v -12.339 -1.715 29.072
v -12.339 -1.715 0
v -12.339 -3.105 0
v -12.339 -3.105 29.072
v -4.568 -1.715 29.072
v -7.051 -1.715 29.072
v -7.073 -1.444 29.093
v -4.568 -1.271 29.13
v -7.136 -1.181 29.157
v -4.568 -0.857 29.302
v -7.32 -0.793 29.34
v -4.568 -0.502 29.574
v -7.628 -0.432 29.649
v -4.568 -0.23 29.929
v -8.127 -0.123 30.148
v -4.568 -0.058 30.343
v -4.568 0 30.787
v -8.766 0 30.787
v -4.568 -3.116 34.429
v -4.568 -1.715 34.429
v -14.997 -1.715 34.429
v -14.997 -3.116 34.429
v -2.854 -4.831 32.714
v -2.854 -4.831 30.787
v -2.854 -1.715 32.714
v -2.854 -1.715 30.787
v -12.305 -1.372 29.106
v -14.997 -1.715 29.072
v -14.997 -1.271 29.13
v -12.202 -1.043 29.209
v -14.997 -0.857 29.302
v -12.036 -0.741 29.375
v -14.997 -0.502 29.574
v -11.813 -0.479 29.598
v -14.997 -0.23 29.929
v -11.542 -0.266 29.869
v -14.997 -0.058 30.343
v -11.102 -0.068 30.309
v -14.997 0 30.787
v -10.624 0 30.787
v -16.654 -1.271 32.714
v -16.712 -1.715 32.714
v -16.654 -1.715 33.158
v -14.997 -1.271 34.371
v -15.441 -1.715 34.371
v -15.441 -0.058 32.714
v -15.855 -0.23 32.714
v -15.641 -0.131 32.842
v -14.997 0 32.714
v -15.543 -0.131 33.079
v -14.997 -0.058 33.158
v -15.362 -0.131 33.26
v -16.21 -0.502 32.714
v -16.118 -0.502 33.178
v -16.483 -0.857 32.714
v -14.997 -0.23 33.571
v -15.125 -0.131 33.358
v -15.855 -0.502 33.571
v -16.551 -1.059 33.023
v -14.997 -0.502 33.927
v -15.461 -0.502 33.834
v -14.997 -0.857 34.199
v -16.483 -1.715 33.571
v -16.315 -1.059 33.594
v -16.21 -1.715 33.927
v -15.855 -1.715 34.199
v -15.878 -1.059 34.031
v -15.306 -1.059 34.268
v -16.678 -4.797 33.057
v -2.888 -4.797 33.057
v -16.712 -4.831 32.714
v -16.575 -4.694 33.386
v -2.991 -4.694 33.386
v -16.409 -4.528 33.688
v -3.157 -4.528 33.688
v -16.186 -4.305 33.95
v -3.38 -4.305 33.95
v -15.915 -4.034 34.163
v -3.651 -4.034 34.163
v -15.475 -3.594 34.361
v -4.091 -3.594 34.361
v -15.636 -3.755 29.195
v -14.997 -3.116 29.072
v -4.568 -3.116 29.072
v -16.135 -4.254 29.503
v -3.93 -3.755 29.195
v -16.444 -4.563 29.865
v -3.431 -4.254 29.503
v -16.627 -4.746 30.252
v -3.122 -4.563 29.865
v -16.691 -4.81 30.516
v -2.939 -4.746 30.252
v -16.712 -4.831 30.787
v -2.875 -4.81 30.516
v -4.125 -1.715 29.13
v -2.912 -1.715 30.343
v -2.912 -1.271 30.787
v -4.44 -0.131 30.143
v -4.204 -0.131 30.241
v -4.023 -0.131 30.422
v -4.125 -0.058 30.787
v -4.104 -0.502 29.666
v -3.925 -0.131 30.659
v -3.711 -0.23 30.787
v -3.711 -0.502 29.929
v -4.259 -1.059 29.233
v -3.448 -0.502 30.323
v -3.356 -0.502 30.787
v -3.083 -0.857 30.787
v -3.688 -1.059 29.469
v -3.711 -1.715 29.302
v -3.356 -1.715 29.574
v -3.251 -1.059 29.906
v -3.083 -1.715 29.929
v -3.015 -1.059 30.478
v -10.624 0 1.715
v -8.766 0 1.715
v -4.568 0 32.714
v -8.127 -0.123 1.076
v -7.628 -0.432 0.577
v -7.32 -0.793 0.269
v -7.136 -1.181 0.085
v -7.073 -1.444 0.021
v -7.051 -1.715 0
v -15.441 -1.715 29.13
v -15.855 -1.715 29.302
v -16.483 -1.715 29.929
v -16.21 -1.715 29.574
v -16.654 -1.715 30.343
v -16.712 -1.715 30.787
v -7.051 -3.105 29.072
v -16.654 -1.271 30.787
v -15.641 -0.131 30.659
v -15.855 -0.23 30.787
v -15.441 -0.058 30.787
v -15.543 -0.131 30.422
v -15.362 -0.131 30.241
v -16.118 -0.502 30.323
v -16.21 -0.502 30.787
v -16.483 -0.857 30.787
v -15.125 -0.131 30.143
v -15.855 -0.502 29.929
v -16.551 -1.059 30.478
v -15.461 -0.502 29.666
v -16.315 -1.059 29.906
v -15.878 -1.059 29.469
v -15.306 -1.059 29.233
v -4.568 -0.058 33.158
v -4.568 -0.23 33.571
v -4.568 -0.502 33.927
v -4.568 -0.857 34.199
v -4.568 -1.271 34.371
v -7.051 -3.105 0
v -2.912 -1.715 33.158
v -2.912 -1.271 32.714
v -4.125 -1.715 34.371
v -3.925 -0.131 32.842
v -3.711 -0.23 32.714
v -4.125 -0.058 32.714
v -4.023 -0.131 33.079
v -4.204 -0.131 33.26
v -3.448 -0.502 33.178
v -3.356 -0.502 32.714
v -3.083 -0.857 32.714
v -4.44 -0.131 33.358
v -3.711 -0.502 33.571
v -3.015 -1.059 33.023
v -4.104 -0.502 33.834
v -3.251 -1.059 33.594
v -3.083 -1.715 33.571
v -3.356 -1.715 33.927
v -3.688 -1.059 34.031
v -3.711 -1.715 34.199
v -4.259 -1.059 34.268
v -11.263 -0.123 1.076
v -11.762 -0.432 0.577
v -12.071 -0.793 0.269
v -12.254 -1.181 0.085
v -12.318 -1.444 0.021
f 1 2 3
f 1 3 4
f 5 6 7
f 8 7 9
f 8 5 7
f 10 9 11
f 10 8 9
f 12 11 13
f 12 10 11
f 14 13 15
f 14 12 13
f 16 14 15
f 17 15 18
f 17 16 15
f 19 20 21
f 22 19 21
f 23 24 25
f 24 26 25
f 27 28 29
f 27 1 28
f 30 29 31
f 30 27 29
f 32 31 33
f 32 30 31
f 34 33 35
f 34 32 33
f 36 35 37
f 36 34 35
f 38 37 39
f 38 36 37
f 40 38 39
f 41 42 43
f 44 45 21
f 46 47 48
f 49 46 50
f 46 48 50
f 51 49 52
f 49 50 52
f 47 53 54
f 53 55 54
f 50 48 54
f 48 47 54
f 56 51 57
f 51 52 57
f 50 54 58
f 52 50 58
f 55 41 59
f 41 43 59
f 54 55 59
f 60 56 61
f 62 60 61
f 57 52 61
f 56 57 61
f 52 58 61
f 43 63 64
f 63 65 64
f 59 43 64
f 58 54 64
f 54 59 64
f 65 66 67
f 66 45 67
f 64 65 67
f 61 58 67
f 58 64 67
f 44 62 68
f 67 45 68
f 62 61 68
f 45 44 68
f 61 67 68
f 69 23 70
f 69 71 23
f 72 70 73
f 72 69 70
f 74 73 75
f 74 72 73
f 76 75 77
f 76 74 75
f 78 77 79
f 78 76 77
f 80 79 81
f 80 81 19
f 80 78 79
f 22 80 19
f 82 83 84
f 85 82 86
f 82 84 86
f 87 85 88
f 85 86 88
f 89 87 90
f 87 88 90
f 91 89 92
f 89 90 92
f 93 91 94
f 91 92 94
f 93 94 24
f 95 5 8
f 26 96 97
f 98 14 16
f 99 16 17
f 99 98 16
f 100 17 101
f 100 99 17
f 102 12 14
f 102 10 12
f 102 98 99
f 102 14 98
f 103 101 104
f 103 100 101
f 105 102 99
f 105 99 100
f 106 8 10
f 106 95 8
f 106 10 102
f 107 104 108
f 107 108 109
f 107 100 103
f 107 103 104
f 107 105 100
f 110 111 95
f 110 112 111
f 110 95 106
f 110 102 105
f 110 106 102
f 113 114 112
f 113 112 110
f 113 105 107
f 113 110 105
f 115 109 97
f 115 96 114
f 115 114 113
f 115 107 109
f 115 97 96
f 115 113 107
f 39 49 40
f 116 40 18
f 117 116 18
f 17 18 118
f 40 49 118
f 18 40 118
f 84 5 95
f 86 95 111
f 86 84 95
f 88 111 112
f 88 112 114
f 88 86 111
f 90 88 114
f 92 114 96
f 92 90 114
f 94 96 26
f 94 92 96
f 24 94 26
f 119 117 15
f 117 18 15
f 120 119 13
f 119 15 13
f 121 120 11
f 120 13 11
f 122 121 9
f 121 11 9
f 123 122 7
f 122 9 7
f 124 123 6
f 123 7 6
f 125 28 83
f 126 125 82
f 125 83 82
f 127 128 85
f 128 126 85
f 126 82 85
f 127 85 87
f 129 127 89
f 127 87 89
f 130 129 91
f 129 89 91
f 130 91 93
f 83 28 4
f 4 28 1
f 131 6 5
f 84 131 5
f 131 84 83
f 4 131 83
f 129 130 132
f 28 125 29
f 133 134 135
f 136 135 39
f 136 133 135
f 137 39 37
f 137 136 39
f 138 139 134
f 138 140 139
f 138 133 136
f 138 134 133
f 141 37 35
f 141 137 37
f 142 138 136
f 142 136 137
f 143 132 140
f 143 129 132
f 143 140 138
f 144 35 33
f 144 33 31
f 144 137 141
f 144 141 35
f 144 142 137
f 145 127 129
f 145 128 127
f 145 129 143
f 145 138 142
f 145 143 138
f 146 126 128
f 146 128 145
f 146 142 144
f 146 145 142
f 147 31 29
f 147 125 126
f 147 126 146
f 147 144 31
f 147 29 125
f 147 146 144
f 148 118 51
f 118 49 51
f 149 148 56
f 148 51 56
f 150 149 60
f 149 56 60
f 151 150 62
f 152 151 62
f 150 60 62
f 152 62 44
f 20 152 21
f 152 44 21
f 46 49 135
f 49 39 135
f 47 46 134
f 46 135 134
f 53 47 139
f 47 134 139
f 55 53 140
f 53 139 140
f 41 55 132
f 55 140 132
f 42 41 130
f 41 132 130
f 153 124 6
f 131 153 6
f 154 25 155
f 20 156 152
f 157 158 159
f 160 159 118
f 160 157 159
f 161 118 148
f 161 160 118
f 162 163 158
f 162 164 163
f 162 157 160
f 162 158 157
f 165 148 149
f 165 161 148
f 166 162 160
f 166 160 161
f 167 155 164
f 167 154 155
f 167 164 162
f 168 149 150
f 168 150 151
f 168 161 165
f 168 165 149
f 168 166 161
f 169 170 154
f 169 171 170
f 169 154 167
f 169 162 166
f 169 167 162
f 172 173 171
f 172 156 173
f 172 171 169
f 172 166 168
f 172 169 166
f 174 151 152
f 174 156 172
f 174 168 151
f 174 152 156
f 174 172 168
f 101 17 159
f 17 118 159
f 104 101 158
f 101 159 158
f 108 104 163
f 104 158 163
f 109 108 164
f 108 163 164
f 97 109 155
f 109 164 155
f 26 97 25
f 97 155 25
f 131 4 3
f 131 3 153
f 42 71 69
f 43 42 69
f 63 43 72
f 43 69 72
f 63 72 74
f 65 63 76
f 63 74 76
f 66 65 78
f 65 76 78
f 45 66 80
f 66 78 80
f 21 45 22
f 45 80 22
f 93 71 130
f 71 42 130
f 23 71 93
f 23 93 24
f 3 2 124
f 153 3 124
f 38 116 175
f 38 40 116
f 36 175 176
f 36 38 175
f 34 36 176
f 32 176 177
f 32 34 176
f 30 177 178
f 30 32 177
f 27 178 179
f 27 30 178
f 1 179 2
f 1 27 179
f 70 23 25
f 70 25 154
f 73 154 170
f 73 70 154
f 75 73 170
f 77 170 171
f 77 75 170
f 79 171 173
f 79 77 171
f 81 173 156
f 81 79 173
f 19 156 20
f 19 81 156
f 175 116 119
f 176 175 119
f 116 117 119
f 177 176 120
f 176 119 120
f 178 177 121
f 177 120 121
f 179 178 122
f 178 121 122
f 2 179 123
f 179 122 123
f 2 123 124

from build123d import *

# Parameters (mm, degrees)
F0_W     = 5.288299
F0_H     = 29.085644
F1_DEPTH = 3.10534
F3_DEPTH = 4.83128
F4_R     = 1.714961


with BuildPart() as f1:
    # F0 (on Front) → F1 (new body)
    with BuildSketch(Plane.XZ):
        with Locations((-9.695214, 14.542822)):
            Rectangle(F0_W, F0_H)
    extrude(amount=F1_DEPTH)

    # F2 (on Front) → F3 (join)
    with BuildSketch(Plane.XZ):
        Polygon((-16.712353, 29.071761), (-12.286842, 29.071761), (-7.046107, 29.071761), (-2.853518, 29.071761), (-2.853518, 34.428958), (-16.712353, 34.428958), align=None)
    extrude(amount=F3_DEPTH)

    # F4
    f4_edges = [f1.edges().sort_by_distance(p)[0] for p in [
        (-16.712353, -2.41564, 34.428958),
        (-16.712353, -2.41564, 29.071761),
        (-2.853518, -2.41564, 34.428958),
        (-9.782935, -4.83128, 29.071761),
        (-2.853518, -2.41564, 29.071761),
        (-9.782935, -4.83128, 34.428958),
        (-16.712353, 0, 31.75036),
        (-14.525858, 0, 29.071761),
        (-12.339364, 0, 14.535881),
        (-9.695214, 0, 0),
        (-7.051065, 0, 14.535881),
        (-4.952291, 0, 29.071761),
        (-2.853518, 0, 31.75036),
        (-9.782935, 0, 34.428958),
    ]]
    fillet(f4_edges, radius=F4_R)


solid = f1.part
